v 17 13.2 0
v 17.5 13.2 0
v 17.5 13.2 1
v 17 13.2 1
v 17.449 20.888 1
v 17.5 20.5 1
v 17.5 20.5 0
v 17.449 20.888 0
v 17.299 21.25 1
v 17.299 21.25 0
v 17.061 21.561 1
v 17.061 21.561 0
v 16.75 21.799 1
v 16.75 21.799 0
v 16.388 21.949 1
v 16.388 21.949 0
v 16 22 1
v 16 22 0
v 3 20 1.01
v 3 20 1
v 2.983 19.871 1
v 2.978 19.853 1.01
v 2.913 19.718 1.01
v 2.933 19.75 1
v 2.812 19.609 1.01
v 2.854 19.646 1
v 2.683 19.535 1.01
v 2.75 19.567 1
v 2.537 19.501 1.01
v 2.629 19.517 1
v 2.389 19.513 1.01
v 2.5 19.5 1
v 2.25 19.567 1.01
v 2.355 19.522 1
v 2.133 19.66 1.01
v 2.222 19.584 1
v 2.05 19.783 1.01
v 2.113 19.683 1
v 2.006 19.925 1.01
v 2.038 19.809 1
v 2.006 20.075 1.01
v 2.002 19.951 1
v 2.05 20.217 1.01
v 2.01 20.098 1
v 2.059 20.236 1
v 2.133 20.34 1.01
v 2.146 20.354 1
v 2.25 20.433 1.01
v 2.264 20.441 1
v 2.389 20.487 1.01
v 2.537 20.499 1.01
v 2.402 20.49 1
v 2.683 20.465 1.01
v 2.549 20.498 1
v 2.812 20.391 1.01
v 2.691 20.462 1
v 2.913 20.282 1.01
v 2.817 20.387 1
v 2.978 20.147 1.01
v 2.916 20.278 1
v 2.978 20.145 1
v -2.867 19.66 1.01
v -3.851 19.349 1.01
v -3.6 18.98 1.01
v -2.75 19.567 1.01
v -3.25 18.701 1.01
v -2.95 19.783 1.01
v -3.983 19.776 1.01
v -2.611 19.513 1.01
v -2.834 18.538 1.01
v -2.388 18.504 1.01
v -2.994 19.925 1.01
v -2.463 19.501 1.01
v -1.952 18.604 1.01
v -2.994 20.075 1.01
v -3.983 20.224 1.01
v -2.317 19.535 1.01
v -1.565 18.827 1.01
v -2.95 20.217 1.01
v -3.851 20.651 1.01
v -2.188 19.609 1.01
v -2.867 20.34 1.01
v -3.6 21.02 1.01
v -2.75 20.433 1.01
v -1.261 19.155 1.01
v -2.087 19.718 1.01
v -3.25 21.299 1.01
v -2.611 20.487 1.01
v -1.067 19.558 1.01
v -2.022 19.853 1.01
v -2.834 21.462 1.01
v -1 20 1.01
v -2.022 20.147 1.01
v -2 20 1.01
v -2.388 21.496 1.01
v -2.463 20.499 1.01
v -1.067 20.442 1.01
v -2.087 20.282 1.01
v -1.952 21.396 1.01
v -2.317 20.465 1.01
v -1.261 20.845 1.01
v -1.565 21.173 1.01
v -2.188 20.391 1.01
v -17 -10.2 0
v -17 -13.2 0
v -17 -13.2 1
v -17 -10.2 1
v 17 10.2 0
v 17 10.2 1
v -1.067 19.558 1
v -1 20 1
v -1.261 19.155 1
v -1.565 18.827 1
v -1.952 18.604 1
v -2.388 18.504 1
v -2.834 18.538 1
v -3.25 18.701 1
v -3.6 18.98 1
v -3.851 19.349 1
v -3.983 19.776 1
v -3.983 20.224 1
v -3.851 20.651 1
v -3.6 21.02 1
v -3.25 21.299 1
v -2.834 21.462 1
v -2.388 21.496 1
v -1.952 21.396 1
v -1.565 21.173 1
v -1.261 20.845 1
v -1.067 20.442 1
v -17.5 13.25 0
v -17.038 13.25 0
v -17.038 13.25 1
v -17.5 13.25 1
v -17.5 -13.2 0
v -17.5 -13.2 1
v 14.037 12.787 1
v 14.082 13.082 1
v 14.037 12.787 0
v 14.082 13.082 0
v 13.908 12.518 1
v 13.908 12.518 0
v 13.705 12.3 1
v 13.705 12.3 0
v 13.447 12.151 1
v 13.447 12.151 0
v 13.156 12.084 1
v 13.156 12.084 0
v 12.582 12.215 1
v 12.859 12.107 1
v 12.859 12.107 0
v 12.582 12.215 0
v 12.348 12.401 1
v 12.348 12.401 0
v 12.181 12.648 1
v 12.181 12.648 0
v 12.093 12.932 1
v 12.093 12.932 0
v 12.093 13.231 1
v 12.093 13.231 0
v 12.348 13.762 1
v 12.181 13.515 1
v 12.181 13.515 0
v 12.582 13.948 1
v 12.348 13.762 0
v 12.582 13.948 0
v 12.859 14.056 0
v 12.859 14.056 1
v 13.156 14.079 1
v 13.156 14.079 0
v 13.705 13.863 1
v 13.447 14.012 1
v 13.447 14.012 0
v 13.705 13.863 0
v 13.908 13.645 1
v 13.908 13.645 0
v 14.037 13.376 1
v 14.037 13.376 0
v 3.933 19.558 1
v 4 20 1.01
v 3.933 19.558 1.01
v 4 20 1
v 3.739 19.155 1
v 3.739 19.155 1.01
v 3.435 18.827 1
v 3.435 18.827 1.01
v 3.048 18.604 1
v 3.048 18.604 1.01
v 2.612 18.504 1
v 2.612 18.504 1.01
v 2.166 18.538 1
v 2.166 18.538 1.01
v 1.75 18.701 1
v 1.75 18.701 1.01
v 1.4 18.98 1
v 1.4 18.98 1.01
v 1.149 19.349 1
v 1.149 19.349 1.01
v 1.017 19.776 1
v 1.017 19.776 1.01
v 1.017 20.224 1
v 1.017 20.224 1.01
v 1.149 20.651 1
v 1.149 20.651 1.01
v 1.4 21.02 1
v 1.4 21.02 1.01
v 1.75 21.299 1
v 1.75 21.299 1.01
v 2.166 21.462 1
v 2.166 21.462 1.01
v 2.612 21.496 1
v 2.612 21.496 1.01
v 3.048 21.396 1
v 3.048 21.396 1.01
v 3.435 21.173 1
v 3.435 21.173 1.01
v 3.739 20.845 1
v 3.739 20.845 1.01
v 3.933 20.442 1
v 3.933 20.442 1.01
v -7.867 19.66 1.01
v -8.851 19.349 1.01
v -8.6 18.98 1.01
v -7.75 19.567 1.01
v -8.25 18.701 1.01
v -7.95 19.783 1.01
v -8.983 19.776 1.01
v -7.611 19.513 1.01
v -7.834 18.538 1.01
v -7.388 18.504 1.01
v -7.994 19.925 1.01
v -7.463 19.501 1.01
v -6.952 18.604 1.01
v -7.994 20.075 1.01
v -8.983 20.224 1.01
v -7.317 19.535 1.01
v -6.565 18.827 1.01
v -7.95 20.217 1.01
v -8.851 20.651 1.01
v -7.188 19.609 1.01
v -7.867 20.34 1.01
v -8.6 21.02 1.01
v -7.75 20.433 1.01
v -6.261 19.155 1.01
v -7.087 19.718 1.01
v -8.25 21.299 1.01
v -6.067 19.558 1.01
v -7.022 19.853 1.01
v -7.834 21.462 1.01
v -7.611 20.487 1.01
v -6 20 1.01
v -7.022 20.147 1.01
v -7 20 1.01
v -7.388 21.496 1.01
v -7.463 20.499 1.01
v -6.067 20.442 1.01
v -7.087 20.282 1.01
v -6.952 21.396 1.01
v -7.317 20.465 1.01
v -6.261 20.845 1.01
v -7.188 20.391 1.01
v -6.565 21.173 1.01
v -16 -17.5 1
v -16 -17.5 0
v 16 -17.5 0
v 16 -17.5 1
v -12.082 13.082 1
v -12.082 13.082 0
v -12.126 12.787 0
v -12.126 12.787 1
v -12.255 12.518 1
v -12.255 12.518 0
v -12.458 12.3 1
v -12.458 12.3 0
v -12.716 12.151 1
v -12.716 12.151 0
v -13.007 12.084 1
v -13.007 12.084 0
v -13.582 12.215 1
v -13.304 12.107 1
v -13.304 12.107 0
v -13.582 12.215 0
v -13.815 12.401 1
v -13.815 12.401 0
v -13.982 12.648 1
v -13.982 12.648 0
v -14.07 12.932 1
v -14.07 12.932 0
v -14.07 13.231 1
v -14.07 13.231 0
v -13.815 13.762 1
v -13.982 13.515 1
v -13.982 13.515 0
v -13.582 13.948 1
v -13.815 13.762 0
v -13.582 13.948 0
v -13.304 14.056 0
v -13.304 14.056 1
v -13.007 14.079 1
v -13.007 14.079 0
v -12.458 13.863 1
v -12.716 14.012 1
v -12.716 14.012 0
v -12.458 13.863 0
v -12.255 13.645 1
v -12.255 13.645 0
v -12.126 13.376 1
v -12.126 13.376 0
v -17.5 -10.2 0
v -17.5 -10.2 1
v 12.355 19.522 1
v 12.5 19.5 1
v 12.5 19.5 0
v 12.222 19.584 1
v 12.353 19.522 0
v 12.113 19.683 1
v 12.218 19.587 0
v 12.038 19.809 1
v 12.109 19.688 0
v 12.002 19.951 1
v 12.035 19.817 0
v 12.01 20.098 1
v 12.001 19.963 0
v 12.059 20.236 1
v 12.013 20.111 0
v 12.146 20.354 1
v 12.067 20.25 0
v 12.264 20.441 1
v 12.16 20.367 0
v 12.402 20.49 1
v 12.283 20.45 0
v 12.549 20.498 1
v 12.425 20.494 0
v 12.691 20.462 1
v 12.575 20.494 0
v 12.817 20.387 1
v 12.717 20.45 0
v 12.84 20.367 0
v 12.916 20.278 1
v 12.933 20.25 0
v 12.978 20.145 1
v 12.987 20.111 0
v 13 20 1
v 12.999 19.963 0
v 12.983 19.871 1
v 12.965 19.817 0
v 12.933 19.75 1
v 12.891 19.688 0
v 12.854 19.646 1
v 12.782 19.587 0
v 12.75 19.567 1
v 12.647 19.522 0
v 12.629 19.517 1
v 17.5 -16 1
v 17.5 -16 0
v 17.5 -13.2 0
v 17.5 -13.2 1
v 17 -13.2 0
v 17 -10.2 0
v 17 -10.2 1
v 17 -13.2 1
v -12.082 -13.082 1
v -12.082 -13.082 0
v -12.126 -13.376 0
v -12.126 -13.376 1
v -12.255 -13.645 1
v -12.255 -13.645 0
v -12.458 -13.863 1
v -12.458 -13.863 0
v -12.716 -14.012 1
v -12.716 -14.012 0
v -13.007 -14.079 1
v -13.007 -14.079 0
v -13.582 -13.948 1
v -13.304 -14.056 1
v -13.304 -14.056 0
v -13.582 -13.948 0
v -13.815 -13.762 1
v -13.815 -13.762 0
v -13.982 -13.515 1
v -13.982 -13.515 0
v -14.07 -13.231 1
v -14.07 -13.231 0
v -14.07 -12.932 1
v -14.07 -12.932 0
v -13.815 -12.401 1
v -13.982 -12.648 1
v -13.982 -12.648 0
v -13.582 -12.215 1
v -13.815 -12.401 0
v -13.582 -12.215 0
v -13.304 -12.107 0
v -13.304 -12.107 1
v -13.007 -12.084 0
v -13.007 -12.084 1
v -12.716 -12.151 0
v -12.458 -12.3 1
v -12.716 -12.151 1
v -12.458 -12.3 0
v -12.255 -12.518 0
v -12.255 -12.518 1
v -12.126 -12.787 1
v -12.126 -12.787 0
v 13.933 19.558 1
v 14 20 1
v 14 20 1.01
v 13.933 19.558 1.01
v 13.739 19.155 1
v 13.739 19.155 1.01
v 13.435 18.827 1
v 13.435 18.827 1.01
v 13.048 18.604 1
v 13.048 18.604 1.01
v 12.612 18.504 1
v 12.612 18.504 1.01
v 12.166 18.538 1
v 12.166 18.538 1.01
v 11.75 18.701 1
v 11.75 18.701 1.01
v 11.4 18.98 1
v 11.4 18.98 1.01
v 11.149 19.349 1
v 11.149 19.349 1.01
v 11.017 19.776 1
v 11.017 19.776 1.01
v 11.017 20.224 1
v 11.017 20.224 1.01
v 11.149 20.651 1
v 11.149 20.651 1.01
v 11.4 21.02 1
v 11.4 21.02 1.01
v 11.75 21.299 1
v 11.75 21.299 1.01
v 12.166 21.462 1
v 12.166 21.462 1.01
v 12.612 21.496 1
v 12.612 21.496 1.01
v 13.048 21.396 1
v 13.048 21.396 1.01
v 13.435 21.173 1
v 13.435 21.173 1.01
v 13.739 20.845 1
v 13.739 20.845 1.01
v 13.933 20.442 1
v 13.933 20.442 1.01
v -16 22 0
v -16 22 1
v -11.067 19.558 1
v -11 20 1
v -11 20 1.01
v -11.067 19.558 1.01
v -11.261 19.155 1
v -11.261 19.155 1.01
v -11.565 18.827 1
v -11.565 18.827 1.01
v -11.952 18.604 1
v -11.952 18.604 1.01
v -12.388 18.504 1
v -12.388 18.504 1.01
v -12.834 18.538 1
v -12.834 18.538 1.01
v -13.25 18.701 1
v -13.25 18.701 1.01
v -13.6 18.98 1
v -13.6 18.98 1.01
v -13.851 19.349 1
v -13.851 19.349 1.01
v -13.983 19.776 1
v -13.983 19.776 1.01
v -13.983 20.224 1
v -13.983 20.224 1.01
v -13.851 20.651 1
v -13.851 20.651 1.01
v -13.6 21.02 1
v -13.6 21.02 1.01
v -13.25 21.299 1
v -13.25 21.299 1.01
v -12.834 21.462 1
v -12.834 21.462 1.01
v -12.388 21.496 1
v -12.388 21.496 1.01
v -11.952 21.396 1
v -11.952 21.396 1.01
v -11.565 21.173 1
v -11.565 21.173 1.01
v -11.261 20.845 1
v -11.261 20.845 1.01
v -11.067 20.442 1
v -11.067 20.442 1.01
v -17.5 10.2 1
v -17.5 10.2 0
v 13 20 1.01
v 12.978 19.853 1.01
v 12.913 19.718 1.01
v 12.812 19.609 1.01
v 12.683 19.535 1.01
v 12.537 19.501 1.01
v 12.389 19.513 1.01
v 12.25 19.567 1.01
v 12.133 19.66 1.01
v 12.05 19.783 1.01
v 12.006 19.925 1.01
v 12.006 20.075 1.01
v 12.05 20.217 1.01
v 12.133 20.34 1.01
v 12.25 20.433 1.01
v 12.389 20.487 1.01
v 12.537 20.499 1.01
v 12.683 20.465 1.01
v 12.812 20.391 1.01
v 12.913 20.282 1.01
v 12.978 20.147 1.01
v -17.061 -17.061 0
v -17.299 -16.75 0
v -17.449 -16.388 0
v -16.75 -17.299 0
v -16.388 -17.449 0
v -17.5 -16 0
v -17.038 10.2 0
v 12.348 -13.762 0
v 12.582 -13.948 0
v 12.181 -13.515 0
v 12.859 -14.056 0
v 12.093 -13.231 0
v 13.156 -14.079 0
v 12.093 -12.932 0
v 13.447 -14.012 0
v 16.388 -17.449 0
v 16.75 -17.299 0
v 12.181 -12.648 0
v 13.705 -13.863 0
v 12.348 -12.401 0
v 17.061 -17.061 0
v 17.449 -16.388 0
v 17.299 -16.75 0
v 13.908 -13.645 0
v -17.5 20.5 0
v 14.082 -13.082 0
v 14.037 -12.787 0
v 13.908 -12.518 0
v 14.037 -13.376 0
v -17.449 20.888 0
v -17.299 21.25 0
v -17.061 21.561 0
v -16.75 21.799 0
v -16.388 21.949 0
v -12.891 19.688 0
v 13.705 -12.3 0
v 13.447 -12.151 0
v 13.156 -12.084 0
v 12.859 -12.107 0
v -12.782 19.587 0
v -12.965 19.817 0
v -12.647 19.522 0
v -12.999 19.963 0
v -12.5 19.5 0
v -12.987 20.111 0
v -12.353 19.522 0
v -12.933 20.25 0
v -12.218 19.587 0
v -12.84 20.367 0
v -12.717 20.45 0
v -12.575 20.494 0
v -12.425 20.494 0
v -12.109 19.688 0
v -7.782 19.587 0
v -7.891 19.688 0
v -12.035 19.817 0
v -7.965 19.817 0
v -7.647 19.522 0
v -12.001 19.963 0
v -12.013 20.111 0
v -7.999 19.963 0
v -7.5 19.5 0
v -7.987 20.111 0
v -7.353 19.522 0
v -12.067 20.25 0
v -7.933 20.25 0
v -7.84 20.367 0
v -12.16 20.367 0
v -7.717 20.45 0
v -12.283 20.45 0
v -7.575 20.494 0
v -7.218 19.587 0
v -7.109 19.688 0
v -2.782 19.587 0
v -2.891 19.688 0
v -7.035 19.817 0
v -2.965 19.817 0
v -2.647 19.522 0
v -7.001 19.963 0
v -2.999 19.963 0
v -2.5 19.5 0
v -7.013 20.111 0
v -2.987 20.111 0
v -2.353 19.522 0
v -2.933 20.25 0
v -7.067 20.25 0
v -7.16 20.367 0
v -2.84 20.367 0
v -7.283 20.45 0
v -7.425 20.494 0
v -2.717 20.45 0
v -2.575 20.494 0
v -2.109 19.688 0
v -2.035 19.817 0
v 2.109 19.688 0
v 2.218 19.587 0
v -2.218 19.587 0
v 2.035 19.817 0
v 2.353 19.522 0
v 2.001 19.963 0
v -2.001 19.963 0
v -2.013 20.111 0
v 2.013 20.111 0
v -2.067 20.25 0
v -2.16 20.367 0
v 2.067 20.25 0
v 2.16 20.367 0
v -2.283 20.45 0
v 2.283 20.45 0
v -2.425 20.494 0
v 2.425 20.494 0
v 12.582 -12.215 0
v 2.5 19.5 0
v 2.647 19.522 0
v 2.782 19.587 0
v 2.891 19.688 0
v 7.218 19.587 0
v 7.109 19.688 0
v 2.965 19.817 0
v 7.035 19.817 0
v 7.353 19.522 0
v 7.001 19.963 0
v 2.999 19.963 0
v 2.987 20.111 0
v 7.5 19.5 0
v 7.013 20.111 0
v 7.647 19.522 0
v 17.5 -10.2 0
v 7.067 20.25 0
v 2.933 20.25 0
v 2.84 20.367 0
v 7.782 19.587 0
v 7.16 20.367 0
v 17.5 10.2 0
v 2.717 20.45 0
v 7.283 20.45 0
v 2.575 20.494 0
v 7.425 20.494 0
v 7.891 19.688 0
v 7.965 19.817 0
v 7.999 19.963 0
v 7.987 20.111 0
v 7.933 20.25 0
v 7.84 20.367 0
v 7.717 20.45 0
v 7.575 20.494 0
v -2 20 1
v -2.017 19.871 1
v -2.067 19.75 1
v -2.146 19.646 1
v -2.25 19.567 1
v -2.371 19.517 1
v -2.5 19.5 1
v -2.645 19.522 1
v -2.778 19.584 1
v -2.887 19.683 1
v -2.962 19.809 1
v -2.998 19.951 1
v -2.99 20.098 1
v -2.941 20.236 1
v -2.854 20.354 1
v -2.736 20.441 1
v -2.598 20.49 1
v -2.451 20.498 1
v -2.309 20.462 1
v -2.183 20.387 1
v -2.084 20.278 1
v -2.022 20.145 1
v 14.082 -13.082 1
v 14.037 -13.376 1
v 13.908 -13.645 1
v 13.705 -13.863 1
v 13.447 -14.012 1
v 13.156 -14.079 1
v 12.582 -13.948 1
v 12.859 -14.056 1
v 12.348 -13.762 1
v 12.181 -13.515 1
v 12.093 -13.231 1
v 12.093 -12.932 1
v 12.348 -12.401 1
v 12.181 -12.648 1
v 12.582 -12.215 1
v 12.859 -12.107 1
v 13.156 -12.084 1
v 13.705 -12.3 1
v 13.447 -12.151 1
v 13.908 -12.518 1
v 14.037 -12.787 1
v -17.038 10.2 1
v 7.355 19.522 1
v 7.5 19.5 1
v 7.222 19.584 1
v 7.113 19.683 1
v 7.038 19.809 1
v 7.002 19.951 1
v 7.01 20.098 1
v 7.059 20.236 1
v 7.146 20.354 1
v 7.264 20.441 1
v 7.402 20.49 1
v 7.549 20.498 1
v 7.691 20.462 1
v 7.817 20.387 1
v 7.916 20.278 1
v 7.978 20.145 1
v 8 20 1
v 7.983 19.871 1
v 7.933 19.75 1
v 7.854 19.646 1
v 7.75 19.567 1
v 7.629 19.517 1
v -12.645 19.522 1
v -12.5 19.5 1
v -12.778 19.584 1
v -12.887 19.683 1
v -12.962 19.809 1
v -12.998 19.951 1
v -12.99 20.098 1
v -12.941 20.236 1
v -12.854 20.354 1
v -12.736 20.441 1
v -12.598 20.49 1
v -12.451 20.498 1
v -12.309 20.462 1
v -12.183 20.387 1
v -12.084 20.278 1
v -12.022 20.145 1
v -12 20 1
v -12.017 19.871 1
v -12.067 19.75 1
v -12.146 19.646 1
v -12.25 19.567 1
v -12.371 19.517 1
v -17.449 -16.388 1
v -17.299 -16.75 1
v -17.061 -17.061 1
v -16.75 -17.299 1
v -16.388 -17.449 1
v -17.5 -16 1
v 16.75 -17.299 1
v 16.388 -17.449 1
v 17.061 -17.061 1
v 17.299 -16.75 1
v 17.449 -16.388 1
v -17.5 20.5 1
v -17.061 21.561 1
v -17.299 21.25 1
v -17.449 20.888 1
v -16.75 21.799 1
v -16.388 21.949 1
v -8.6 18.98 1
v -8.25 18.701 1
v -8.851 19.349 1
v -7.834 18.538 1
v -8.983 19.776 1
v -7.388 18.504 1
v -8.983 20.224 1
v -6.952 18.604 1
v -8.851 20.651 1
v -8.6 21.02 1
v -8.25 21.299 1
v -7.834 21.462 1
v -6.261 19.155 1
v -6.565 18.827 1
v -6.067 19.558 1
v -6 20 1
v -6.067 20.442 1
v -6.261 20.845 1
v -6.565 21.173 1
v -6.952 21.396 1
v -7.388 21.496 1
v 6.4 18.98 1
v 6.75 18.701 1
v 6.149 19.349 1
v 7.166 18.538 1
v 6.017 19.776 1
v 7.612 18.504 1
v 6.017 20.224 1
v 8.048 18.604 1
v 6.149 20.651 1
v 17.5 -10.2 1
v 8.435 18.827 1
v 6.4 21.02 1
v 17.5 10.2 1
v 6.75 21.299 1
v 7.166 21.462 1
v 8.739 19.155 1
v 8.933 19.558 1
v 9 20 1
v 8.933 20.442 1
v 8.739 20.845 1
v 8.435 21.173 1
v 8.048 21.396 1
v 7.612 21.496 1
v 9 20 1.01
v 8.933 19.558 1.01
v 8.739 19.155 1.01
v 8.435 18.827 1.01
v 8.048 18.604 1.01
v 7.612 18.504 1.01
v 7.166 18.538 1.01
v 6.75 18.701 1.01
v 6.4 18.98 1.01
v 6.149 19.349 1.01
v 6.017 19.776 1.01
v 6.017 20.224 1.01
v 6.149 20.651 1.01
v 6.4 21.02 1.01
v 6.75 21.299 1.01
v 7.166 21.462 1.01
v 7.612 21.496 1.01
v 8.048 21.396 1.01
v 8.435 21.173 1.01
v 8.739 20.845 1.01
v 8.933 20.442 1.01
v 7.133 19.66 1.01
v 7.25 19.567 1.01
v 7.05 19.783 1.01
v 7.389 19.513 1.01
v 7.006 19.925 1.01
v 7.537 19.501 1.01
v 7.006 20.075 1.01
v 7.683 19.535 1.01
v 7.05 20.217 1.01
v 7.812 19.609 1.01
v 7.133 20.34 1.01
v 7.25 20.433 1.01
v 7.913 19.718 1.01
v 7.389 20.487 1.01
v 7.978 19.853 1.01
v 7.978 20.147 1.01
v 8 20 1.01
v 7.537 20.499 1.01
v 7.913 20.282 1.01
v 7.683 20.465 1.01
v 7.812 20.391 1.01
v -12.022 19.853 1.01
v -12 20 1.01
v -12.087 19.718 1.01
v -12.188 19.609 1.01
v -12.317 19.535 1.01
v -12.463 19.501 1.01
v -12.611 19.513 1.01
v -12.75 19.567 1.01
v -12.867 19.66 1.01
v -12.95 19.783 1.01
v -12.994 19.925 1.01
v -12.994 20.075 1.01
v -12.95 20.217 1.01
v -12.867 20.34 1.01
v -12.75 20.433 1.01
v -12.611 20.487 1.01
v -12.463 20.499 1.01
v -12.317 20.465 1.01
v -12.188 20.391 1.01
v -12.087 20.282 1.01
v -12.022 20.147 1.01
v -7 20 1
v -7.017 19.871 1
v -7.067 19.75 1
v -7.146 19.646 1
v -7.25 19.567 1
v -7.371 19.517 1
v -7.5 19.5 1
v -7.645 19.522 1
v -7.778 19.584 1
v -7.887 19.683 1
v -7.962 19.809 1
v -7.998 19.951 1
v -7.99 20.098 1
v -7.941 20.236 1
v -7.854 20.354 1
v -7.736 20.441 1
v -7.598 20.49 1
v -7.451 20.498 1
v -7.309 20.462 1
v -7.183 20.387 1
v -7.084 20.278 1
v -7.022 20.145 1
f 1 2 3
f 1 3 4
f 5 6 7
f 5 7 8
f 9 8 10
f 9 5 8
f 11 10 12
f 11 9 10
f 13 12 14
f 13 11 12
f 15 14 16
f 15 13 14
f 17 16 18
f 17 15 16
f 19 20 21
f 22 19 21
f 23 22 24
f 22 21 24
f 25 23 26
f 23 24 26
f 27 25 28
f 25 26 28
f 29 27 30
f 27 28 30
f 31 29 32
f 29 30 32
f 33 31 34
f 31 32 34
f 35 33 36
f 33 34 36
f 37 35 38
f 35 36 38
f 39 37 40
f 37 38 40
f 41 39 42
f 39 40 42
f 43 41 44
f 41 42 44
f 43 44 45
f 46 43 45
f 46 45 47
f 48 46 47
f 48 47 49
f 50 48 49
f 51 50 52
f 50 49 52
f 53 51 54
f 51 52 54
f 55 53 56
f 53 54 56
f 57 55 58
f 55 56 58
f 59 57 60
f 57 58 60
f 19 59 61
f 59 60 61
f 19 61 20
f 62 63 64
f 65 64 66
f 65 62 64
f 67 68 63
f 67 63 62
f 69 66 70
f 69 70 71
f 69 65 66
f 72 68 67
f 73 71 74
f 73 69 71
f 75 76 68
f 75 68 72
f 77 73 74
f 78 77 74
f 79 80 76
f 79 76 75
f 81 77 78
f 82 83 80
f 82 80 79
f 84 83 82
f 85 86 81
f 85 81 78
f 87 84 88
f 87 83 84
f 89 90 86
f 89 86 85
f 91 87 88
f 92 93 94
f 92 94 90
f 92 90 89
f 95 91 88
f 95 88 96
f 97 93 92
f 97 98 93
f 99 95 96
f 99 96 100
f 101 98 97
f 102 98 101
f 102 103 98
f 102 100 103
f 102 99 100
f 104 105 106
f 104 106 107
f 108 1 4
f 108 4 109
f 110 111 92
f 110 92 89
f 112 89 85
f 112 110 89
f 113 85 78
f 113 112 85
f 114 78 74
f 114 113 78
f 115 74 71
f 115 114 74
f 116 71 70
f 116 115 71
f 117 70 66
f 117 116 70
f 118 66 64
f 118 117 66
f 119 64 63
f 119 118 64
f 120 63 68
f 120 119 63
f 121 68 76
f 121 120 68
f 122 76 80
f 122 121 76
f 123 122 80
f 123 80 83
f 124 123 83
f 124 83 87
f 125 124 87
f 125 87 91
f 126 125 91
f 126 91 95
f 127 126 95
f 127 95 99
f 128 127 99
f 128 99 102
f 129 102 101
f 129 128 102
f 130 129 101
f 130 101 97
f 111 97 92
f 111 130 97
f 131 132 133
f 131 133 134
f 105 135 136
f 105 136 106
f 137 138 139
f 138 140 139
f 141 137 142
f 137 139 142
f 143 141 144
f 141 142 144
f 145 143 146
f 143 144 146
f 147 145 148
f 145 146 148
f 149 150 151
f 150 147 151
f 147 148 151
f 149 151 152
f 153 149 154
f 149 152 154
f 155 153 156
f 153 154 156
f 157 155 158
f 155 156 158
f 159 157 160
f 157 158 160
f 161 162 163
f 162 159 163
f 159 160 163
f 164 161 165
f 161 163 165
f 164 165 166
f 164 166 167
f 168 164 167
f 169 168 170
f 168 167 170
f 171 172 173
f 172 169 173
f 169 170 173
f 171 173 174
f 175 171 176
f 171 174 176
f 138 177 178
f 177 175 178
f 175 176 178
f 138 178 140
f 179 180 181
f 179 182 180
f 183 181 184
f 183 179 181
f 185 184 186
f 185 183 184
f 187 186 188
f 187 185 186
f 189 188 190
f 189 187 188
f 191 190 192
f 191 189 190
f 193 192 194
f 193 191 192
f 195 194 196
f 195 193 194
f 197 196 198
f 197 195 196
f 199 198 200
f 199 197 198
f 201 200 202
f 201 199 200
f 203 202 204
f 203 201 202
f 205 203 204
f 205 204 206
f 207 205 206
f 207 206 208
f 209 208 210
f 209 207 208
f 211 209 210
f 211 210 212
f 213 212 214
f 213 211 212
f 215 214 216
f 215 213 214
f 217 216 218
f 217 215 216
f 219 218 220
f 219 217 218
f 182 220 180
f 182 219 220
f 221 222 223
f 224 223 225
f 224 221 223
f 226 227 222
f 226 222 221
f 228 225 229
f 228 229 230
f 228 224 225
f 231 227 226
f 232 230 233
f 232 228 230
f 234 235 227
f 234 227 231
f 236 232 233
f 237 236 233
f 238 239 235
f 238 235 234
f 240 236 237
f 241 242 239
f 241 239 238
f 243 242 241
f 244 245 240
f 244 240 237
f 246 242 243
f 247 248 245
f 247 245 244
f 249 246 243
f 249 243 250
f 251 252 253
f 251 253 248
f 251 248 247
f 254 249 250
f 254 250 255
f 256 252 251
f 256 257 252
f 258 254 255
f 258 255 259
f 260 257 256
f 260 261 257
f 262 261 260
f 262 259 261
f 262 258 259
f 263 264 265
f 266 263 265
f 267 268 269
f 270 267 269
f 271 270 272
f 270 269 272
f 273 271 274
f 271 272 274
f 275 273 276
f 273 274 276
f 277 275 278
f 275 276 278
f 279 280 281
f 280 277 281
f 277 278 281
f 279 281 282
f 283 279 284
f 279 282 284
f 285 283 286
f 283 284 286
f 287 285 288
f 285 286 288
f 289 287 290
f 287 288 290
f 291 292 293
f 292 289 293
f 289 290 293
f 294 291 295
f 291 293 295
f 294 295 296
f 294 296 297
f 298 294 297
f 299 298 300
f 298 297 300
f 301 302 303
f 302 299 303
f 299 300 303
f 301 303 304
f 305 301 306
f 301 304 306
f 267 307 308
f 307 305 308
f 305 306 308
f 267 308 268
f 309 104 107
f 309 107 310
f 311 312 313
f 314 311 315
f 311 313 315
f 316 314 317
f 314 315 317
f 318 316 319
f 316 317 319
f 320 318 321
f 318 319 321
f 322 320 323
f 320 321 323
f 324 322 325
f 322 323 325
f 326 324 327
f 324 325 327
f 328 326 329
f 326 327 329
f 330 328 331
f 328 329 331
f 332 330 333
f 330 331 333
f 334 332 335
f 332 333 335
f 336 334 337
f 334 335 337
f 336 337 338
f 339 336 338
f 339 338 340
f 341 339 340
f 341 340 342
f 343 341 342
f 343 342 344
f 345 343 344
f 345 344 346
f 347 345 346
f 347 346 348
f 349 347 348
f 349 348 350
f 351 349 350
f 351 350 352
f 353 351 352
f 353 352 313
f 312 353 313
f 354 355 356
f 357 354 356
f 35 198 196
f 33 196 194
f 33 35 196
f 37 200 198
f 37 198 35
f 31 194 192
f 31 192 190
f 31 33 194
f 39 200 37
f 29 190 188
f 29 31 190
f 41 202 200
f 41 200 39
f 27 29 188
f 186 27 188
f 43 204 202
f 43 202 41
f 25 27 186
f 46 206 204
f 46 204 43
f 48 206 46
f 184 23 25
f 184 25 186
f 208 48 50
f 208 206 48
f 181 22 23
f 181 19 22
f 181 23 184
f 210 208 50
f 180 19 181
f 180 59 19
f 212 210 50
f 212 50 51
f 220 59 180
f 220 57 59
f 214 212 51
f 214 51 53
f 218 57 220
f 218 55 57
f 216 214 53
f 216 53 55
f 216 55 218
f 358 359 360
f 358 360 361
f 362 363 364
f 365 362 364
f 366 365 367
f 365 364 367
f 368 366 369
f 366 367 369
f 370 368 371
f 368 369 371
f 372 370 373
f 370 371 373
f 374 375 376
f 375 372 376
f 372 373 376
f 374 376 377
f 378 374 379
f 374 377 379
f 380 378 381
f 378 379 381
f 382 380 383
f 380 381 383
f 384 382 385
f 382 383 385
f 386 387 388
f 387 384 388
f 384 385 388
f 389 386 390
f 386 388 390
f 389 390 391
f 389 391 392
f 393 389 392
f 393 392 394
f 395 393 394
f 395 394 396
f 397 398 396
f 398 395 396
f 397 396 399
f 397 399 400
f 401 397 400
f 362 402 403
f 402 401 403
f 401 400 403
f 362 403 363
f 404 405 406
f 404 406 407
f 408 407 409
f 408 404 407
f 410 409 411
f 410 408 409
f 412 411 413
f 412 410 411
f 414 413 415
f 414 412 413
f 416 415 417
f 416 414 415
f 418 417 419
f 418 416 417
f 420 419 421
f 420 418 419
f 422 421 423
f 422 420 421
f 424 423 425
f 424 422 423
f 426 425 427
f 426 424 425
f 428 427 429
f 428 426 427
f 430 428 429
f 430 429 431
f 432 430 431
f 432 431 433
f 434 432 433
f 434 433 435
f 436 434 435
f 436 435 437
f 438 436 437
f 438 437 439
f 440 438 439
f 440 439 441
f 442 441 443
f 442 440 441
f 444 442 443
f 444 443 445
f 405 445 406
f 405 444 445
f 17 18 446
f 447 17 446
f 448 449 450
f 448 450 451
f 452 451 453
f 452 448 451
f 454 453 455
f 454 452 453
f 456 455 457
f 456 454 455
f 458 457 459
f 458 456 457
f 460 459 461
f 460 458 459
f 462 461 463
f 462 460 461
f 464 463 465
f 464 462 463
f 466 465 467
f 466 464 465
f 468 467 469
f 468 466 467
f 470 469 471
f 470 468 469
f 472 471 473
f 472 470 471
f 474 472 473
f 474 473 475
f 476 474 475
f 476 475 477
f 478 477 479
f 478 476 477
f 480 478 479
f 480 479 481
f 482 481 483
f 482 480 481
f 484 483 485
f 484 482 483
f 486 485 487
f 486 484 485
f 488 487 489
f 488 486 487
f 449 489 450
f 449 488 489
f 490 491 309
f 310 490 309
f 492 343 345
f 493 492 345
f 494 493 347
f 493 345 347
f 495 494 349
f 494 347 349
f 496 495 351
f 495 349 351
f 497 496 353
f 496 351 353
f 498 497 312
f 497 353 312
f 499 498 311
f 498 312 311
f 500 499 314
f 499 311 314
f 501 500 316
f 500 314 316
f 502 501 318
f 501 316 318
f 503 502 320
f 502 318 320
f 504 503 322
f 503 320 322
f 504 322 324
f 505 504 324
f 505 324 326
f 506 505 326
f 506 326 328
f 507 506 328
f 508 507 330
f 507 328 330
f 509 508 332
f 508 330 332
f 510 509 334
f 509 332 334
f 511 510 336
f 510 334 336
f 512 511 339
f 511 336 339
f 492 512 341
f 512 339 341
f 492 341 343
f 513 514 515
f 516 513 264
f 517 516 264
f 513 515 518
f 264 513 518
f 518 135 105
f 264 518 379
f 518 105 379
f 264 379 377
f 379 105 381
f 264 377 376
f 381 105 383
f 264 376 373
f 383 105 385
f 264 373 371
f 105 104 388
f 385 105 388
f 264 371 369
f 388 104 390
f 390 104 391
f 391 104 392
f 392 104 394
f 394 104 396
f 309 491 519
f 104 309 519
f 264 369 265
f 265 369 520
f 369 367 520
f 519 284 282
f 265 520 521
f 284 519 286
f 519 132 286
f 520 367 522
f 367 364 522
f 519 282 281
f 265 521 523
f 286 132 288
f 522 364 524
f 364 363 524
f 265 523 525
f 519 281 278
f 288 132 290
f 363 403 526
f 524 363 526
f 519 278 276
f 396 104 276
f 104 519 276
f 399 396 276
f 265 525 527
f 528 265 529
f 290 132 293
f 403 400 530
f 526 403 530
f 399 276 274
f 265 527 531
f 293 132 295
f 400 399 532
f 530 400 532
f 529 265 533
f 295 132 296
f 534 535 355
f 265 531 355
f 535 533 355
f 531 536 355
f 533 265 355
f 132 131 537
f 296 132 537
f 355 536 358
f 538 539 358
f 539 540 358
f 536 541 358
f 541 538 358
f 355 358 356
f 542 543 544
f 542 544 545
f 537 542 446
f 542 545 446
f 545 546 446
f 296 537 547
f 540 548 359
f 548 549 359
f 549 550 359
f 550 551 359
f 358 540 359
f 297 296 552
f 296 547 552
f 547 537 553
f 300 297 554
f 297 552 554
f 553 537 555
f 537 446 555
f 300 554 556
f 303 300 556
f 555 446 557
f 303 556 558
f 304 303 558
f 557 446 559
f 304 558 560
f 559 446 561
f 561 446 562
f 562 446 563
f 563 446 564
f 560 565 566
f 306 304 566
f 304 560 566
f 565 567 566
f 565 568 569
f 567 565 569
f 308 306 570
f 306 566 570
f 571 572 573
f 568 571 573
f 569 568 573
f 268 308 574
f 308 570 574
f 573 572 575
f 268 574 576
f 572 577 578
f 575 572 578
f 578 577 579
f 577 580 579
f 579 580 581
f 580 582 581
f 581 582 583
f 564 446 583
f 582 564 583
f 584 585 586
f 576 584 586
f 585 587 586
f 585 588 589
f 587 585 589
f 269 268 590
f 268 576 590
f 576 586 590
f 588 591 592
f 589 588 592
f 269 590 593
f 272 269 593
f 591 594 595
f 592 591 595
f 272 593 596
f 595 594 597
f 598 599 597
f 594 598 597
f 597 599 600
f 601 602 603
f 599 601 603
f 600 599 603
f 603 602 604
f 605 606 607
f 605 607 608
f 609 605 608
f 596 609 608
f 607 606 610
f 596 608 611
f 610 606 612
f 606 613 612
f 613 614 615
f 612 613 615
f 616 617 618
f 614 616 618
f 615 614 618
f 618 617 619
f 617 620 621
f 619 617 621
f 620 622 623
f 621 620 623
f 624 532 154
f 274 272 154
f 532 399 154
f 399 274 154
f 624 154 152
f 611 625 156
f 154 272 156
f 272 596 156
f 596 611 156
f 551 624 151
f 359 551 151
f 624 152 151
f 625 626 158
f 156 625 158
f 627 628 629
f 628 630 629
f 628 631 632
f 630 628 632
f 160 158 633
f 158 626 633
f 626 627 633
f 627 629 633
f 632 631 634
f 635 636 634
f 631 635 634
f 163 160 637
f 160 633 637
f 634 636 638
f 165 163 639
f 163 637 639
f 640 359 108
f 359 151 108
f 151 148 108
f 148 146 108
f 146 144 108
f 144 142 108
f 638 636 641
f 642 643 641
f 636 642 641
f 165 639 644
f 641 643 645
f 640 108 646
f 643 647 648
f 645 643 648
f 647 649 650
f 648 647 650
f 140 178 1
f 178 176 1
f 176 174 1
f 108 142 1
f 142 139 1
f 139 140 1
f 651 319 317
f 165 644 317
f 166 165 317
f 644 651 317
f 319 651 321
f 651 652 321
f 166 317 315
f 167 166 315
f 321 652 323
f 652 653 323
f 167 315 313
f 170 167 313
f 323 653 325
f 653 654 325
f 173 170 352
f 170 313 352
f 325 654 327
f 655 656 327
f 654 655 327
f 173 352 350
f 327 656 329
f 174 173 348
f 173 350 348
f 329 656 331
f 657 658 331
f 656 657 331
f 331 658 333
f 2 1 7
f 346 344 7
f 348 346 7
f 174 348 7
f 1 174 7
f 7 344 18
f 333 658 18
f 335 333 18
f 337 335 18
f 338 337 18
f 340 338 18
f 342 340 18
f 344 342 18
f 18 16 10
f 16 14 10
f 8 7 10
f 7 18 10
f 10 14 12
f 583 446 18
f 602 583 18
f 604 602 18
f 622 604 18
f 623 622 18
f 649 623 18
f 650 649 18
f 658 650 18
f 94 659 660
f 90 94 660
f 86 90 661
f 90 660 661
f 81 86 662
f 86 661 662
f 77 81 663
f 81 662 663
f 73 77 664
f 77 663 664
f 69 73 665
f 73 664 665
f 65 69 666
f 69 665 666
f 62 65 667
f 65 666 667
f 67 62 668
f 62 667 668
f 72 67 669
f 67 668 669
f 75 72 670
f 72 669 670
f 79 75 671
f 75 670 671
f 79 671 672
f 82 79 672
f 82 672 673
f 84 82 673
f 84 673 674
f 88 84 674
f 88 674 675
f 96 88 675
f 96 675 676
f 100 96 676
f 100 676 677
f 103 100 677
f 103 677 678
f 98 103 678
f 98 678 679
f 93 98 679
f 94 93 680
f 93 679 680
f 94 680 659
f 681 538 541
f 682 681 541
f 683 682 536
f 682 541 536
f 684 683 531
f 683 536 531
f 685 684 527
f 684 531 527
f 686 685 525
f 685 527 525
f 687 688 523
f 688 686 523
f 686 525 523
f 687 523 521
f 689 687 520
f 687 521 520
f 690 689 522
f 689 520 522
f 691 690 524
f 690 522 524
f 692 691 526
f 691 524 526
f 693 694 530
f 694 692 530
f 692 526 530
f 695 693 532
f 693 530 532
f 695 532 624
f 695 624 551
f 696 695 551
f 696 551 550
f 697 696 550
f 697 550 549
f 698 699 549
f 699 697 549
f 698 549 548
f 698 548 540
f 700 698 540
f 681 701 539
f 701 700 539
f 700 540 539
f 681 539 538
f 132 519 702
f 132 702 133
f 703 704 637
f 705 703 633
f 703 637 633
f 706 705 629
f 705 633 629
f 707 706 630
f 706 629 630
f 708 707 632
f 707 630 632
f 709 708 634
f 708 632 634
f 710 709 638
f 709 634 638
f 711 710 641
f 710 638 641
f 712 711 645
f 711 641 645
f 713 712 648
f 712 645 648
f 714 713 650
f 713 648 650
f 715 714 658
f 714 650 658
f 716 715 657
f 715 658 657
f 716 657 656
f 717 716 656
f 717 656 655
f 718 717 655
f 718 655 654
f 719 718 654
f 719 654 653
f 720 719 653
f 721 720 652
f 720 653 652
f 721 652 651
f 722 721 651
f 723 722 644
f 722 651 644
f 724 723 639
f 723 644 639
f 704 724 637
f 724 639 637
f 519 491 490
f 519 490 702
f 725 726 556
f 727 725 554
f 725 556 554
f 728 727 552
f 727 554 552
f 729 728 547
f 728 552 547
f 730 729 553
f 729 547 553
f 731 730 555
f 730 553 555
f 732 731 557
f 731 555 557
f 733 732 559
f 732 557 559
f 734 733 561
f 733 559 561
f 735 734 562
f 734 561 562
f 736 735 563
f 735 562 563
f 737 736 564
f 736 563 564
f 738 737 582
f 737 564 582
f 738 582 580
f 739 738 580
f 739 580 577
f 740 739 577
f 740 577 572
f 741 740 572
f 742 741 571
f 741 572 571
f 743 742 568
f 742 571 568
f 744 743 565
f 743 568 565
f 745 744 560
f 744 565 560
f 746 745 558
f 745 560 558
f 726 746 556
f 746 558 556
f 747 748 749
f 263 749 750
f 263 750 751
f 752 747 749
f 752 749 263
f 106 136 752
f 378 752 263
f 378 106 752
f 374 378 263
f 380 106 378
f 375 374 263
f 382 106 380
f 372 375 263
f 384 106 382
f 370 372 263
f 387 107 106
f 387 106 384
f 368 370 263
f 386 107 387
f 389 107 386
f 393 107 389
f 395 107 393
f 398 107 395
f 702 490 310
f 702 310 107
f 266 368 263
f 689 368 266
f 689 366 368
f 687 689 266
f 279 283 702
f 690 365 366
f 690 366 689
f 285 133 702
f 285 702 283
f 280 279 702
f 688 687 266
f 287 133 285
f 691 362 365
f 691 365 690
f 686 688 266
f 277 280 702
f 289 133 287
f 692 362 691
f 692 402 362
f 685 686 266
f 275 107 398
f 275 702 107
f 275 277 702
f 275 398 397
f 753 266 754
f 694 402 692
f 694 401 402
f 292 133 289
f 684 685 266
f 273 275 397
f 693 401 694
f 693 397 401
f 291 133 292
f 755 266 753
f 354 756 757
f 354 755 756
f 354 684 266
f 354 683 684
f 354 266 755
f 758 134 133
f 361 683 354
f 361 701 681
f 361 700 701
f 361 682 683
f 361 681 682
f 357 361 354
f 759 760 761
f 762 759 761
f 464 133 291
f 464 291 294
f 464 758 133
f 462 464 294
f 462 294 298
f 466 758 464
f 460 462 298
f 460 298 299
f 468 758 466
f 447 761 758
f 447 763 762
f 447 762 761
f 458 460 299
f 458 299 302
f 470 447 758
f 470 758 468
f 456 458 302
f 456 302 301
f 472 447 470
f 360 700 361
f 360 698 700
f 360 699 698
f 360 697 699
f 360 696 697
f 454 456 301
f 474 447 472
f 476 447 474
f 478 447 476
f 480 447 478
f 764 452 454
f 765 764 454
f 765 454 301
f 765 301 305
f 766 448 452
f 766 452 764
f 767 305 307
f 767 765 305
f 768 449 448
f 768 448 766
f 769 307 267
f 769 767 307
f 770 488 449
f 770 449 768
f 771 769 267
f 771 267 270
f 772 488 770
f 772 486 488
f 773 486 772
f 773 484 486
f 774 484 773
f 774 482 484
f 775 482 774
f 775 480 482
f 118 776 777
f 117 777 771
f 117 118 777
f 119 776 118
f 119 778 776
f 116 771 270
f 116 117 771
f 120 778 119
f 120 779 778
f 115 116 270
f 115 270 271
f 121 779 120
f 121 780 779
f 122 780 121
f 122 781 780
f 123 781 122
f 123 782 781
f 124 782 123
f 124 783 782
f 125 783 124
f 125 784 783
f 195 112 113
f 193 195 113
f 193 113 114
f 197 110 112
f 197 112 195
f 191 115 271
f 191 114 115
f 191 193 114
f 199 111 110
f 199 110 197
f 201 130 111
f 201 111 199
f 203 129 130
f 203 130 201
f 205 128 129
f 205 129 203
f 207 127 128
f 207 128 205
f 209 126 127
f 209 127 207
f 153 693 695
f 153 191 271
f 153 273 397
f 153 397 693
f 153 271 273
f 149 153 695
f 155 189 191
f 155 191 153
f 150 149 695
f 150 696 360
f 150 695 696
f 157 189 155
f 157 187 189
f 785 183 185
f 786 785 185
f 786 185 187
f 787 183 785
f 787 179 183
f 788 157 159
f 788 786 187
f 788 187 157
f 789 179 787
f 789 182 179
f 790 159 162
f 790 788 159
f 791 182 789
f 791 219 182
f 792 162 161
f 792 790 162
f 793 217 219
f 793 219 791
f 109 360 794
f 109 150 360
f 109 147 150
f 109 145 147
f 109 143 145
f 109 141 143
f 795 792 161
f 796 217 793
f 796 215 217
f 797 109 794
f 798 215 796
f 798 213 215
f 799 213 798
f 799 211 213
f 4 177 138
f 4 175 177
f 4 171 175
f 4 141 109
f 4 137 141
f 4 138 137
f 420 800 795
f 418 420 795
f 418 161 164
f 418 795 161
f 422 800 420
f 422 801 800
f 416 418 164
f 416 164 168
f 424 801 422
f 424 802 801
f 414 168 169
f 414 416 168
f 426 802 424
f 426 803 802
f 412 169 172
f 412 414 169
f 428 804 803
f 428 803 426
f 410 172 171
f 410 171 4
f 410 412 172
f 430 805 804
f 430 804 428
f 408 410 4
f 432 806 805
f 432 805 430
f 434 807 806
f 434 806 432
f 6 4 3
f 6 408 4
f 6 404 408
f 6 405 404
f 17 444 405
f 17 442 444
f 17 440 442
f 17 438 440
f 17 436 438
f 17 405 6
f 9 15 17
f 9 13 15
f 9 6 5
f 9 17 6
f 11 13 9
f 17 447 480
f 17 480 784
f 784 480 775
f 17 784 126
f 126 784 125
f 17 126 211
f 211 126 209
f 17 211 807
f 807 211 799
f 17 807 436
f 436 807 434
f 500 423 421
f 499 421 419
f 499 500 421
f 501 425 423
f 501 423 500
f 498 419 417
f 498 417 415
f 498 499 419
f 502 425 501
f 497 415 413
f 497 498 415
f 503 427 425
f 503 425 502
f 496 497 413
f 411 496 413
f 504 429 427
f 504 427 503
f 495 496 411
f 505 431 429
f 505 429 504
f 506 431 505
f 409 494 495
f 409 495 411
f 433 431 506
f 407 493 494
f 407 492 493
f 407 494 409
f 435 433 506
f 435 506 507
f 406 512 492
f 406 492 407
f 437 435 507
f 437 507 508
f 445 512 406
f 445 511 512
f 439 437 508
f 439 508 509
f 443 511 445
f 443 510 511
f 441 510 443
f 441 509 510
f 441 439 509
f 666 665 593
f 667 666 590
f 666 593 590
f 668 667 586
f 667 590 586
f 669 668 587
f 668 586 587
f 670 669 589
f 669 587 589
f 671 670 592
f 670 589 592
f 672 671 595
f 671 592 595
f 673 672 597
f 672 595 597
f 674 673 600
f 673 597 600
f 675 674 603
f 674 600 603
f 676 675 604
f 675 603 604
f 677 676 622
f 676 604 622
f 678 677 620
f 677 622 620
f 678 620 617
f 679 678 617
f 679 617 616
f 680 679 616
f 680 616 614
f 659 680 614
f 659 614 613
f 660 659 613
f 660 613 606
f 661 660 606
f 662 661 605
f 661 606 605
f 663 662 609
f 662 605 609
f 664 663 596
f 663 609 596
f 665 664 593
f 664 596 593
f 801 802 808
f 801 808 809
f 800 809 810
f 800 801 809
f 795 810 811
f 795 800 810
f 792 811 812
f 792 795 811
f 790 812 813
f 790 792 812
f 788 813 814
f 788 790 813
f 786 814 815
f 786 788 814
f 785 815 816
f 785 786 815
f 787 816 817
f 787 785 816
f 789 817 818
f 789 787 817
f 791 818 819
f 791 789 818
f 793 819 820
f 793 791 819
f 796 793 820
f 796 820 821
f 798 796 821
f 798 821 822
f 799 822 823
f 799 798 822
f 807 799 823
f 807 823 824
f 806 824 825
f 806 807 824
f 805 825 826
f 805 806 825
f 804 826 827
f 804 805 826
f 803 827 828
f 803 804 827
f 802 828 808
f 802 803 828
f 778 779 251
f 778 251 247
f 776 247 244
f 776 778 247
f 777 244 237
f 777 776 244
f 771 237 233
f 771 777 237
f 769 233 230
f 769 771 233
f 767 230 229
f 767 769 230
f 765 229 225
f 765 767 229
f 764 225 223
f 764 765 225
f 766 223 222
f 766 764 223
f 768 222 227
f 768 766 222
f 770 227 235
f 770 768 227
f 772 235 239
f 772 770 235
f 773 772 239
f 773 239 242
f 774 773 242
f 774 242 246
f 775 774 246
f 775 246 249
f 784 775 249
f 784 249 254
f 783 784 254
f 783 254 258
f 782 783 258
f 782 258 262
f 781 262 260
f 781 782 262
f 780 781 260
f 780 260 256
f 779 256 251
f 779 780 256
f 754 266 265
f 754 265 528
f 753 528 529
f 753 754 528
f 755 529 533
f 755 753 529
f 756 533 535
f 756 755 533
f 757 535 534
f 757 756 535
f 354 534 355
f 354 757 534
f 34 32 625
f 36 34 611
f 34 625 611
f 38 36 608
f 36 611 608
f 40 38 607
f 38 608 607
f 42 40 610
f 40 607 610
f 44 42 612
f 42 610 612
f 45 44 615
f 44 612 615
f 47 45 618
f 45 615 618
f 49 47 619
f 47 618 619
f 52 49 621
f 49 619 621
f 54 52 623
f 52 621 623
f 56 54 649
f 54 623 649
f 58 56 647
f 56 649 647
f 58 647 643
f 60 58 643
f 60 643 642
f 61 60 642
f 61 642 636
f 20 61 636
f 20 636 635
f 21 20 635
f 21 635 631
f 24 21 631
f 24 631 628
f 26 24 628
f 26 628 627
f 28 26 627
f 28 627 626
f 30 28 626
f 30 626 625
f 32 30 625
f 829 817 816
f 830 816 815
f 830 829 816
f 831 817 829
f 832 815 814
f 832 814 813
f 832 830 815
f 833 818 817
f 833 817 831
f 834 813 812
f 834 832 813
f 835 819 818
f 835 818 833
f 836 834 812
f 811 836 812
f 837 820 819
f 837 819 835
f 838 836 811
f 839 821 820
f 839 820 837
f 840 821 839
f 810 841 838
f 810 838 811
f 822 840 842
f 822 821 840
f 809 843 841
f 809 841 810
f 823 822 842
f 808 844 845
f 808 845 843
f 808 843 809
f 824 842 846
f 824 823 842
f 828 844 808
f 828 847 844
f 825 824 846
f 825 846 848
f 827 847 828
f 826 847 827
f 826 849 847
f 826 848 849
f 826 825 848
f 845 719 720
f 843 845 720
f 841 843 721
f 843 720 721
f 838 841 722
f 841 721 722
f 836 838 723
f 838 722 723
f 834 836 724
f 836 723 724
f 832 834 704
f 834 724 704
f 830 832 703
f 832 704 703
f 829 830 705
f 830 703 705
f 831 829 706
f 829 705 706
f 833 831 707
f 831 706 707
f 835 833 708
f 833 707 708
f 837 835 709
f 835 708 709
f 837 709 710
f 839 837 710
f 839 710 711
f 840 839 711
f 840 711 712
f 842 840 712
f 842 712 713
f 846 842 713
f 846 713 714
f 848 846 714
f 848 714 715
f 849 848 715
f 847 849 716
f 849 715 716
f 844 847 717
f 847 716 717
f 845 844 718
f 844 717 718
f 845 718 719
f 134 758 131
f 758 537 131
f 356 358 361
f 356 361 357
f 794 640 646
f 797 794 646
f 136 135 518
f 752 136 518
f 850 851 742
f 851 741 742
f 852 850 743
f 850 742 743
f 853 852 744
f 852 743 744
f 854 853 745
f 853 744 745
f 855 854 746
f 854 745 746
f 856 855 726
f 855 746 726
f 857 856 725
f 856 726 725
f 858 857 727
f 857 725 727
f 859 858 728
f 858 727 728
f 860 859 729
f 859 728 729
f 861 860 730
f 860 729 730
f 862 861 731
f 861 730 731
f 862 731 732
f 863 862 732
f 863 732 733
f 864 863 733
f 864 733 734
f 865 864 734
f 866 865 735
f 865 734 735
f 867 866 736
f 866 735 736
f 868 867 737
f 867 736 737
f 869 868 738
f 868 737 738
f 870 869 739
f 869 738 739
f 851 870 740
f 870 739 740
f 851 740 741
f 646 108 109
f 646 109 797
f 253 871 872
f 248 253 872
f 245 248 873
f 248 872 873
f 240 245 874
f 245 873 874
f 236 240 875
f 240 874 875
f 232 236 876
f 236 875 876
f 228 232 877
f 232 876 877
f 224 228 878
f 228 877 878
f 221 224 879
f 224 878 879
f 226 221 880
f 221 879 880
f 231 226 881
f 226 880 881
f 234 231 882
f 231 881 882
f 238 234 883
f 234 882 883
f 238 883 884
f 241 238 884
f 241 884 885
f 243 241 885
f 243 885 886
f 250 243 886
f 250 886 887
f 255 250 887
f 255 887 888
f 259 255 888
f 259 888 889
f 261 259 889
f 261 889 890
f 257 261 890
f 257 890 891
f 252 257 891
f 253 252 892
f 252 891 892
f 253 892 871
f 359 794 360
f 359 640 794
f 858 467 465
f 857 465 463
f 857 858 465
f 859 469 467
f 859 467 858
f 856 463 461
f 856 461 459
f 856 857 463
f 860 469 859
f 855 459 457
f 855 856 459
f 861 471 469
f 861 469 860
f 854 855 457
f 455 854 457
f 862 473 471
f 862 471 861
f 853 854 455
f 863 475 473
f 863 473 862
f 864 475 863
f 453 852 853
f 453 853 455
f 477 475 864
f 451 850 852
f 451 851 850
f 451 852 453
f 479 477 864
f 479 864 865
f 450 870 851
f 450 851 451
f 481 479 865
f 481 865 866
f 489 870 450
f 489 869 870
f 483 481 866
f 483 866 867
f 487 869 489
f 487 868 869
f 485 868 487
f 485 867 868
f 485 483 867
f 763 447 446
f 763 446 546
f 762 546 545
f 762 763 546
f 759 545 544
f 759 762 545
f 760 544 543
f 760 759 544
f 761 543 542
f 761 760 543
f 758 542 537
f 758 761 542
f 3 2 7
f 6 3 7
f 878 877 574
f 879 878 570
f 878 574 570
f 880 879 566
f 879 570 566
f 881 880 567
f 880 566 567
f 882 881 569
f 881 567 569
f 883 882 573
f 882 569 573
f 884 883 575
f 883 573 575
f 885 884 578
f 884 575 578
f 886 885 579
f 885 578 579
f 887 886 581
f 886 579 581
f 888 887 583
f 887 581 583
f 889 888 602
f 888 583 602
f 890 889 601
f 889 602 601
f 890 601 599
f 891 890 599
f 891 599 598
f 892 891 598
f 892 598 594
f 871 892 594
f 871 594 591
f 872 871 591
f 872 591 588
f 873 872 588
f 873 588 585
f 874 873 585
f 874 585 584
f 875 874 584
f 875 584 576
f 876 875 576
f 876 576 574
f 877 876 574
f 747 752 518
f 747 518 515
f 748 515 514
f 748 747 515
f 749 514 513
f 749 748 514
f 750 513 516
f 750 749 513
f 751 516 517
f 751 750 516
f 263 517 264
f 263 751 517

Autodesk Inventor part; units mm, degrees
ref_plane "YZ Plane" through (0, 0, 0) normal (1, 0, 0) x (0, 1, 0)
ref_plane "XZ Plane" through (0, 0, 0) normal (0, 1, 0) x (-1, 0, 0)
ref_plane "XY Plane" through (0, 0, 0) normal (0, 0, 1) x (1, 0, 0)
sketch "スケッチ1" plane through (0, 0, 0) normal (0, 0, 1) x (1, 0, 0)
  circle A0 centre (13.0815, -13.0815) radius 1
  circle A1 centre (-13.0815, 13.0815) radius 1
  circle A2 centre (13.0815, 13.0815) radius 1
  line L0 (-17.5, -17.5) -> (17.5, -17.5)
  line L1 (17.5, -17.5) -> (17.5, -13.2)
  line L2 (17.5, 22) -> (-17.5, 22)
  line L3 (-17.5, 22) -> (-17.5, 13.2505)
  line L4 (-17.0382, 13.2505) -> (-17.5, 13.2505)
  line L5 (-17.5, 13.2505) -> (-17.5, 13.2)
  line L6 (-17.5, 10.2) -> (-17.0382, 10.2)
  line L7 (-17.0382, 10.2) -> (-17.0382, 13.2505)
  line L8 (-17, -10.2) -> (-17.5, -10.2)
  line L9 (-17.5, -10.2) -> (-17.5, -13.2)
  line L10 (-17.5, -13.2) -> (-17, -13.2)
  line L11 (-17, -13.2) -> (-17, -10.2)
  line L12 (17.5, -10.2) -> (17, -10.2)
  line L13 (17, -10.2) -> (17, -13.2)
  line L14 (17, -13.2) -> (17.5, -13.2)
  line L15 (17.5, -13.2) -> (17.5, -10.2)
  line L16 (17.5, 13.2) -> (17, 13.2)
  line L17 (17, 13.2) -> (17, 10.2)
  line L18 (17, 10.2) -> (17.5, 10.2)
  line L19 (17.5, 10.2) -> (17.5, 13.2)
  line L20 (17, 13.2) -> (17.5, 13.2)
  line L21 (17.5, 13.2) -> (17.5, 22)
  line L22 (17.5, 10.2) -> (17.5, 13.2)
  line L23 (17.5, -10.2) -> (17.5, 10.2)
  line L24 (17.5, -13.2) -> (17.5, -10.2)
  line L25 (-17.5, -13.2) -> (-17.5, -17.5)
  line L26 (-17.5, -10.2) -> (-17.5, -13.2)
  line L27 (-17.5, 13.2505) -> (-17.5, 13.2)
  line L28 (-17.5, 13.2) -> (-17.5, 10.2)
  line L29 (-17.5, 10.2) -> (-17.5, -10.2)
  line L30 (-17.5, 13.2) -> (-17.5, 10.2)
  circle A3 centre (-13.0815, 13.0815) radius 1
  circle A4 centre (13.0815, 13.0815) radius 1
  circle A5 centre (-13.0815, -13.0815) radius 1
  circle A6 centre (13.0815, -13.0815) radius 1
  circle A7 centre (-13.0815, -13.0815) radius 1
  point P0 (0, 0)
  point P1 (0, 0)
  dimension "d0" = 39.5
  dimension "d1" = 2
extrude "押し出し1" add sketch "スケッチ1" along normal blind 1 contours L25 L10 L11 L8 L29 L6 L7 L4 L3 L2 L21 L16 L17 L18 L23 L12 L13 L14 L1 L0
fillet "フィレット1" radius 1.5 4 edges at (-17.5, -17.5, 0.5) (-17.5, 22, 0.5) (17.5, 22, 0.5) (17.5, -17.5, 0.5)
sketch "スケッチ2" plane through (0, 0, 1) normal (0, 0, 1) x (1, 0, 0)
  line L0 (17.5, 20.5) -> (17.5, 13.2) projected
  line L1 (-16, 22) -> (16, 22) projected
  line L2 (-17.5, 13.2505) -> (-17.5, 20.5) projected
  line L3 (16, -17.5) -> (-16, -17.5) projected
  line L4 (17.5, 20) -> (-17.5, 20)
  line L5 (0, 22) -> (0, -17.5)
  point P0 (0, 0)
  point P1 (2.5, 20)
  point P2 (7.5, 20)
  point P3 (12.5, 20)
  point P4 (-2.5, 20)
  point P5 (-7.5, 20)
  point P6 (-12.5, 20)
  dimension "d5" = 2
  dimension "d6" = 12.5
  dimension "d9" = 5
  dimension "d10" = 5
hole "Hole1" at (2.5, 20, 1) at (7.5, 20, 1) at (12.5, 20, 1) at (-12.5, 20, 1) at (-7.5, 20, 1) at (-2.5, 20, 1) direction (0, 0, -1) diameter 1 end through all
sketch "スケッチ3" plane through (0, 0, 1) normal (0, 0, 1) x (1, 0, 0)
  circle A0 centre (-2.5, 20) radius 0.5 projected
  circle A1 centre (-7.5, 20) radius 0.5 projected
  circle A2 centre (-12.5, 20) radius 0.5 projected
  circle A3 centre (12.5, 20) radius 0.5 projected
  circle A4 centre (7.5, 20) radius 0.5 projected
  circle A5 centre (2.5, 20) radius 0.5 projected
  circle A6 centre (12.5, 20) radius 1.5
  circle A7 centre (7.5, 20) radius 1.5
  circle A8 centre (2.5, 20) radius 1.5
  circle A9 centre (-2.5, 20) radius 1.5
  circle A10 centre (-7.5, 20) radius 1.5
  circle A11 centre (-12.5, 20) radius 1.5
  point P0 (0, 0)
  dimension "d18" = 3
  dimension "d19" = 3
  dimension "d20" = 3
  dimension "d21" = 3
  dimension "d22" = 3
  dimension "d23" = 3
extrude "押し出し2" add sketch "スケッチ3" along normal blind 0.01
equation "\"d10\" = d9"
equation "\"d19\" = d18"
equation "\"d20\" = d18"
equation "\"d21\" = d18"
equation "\"d22\" = d18"
equation "\"d23\" = d18"
properties part number "SLIPRING_SRG-1-6G_"
